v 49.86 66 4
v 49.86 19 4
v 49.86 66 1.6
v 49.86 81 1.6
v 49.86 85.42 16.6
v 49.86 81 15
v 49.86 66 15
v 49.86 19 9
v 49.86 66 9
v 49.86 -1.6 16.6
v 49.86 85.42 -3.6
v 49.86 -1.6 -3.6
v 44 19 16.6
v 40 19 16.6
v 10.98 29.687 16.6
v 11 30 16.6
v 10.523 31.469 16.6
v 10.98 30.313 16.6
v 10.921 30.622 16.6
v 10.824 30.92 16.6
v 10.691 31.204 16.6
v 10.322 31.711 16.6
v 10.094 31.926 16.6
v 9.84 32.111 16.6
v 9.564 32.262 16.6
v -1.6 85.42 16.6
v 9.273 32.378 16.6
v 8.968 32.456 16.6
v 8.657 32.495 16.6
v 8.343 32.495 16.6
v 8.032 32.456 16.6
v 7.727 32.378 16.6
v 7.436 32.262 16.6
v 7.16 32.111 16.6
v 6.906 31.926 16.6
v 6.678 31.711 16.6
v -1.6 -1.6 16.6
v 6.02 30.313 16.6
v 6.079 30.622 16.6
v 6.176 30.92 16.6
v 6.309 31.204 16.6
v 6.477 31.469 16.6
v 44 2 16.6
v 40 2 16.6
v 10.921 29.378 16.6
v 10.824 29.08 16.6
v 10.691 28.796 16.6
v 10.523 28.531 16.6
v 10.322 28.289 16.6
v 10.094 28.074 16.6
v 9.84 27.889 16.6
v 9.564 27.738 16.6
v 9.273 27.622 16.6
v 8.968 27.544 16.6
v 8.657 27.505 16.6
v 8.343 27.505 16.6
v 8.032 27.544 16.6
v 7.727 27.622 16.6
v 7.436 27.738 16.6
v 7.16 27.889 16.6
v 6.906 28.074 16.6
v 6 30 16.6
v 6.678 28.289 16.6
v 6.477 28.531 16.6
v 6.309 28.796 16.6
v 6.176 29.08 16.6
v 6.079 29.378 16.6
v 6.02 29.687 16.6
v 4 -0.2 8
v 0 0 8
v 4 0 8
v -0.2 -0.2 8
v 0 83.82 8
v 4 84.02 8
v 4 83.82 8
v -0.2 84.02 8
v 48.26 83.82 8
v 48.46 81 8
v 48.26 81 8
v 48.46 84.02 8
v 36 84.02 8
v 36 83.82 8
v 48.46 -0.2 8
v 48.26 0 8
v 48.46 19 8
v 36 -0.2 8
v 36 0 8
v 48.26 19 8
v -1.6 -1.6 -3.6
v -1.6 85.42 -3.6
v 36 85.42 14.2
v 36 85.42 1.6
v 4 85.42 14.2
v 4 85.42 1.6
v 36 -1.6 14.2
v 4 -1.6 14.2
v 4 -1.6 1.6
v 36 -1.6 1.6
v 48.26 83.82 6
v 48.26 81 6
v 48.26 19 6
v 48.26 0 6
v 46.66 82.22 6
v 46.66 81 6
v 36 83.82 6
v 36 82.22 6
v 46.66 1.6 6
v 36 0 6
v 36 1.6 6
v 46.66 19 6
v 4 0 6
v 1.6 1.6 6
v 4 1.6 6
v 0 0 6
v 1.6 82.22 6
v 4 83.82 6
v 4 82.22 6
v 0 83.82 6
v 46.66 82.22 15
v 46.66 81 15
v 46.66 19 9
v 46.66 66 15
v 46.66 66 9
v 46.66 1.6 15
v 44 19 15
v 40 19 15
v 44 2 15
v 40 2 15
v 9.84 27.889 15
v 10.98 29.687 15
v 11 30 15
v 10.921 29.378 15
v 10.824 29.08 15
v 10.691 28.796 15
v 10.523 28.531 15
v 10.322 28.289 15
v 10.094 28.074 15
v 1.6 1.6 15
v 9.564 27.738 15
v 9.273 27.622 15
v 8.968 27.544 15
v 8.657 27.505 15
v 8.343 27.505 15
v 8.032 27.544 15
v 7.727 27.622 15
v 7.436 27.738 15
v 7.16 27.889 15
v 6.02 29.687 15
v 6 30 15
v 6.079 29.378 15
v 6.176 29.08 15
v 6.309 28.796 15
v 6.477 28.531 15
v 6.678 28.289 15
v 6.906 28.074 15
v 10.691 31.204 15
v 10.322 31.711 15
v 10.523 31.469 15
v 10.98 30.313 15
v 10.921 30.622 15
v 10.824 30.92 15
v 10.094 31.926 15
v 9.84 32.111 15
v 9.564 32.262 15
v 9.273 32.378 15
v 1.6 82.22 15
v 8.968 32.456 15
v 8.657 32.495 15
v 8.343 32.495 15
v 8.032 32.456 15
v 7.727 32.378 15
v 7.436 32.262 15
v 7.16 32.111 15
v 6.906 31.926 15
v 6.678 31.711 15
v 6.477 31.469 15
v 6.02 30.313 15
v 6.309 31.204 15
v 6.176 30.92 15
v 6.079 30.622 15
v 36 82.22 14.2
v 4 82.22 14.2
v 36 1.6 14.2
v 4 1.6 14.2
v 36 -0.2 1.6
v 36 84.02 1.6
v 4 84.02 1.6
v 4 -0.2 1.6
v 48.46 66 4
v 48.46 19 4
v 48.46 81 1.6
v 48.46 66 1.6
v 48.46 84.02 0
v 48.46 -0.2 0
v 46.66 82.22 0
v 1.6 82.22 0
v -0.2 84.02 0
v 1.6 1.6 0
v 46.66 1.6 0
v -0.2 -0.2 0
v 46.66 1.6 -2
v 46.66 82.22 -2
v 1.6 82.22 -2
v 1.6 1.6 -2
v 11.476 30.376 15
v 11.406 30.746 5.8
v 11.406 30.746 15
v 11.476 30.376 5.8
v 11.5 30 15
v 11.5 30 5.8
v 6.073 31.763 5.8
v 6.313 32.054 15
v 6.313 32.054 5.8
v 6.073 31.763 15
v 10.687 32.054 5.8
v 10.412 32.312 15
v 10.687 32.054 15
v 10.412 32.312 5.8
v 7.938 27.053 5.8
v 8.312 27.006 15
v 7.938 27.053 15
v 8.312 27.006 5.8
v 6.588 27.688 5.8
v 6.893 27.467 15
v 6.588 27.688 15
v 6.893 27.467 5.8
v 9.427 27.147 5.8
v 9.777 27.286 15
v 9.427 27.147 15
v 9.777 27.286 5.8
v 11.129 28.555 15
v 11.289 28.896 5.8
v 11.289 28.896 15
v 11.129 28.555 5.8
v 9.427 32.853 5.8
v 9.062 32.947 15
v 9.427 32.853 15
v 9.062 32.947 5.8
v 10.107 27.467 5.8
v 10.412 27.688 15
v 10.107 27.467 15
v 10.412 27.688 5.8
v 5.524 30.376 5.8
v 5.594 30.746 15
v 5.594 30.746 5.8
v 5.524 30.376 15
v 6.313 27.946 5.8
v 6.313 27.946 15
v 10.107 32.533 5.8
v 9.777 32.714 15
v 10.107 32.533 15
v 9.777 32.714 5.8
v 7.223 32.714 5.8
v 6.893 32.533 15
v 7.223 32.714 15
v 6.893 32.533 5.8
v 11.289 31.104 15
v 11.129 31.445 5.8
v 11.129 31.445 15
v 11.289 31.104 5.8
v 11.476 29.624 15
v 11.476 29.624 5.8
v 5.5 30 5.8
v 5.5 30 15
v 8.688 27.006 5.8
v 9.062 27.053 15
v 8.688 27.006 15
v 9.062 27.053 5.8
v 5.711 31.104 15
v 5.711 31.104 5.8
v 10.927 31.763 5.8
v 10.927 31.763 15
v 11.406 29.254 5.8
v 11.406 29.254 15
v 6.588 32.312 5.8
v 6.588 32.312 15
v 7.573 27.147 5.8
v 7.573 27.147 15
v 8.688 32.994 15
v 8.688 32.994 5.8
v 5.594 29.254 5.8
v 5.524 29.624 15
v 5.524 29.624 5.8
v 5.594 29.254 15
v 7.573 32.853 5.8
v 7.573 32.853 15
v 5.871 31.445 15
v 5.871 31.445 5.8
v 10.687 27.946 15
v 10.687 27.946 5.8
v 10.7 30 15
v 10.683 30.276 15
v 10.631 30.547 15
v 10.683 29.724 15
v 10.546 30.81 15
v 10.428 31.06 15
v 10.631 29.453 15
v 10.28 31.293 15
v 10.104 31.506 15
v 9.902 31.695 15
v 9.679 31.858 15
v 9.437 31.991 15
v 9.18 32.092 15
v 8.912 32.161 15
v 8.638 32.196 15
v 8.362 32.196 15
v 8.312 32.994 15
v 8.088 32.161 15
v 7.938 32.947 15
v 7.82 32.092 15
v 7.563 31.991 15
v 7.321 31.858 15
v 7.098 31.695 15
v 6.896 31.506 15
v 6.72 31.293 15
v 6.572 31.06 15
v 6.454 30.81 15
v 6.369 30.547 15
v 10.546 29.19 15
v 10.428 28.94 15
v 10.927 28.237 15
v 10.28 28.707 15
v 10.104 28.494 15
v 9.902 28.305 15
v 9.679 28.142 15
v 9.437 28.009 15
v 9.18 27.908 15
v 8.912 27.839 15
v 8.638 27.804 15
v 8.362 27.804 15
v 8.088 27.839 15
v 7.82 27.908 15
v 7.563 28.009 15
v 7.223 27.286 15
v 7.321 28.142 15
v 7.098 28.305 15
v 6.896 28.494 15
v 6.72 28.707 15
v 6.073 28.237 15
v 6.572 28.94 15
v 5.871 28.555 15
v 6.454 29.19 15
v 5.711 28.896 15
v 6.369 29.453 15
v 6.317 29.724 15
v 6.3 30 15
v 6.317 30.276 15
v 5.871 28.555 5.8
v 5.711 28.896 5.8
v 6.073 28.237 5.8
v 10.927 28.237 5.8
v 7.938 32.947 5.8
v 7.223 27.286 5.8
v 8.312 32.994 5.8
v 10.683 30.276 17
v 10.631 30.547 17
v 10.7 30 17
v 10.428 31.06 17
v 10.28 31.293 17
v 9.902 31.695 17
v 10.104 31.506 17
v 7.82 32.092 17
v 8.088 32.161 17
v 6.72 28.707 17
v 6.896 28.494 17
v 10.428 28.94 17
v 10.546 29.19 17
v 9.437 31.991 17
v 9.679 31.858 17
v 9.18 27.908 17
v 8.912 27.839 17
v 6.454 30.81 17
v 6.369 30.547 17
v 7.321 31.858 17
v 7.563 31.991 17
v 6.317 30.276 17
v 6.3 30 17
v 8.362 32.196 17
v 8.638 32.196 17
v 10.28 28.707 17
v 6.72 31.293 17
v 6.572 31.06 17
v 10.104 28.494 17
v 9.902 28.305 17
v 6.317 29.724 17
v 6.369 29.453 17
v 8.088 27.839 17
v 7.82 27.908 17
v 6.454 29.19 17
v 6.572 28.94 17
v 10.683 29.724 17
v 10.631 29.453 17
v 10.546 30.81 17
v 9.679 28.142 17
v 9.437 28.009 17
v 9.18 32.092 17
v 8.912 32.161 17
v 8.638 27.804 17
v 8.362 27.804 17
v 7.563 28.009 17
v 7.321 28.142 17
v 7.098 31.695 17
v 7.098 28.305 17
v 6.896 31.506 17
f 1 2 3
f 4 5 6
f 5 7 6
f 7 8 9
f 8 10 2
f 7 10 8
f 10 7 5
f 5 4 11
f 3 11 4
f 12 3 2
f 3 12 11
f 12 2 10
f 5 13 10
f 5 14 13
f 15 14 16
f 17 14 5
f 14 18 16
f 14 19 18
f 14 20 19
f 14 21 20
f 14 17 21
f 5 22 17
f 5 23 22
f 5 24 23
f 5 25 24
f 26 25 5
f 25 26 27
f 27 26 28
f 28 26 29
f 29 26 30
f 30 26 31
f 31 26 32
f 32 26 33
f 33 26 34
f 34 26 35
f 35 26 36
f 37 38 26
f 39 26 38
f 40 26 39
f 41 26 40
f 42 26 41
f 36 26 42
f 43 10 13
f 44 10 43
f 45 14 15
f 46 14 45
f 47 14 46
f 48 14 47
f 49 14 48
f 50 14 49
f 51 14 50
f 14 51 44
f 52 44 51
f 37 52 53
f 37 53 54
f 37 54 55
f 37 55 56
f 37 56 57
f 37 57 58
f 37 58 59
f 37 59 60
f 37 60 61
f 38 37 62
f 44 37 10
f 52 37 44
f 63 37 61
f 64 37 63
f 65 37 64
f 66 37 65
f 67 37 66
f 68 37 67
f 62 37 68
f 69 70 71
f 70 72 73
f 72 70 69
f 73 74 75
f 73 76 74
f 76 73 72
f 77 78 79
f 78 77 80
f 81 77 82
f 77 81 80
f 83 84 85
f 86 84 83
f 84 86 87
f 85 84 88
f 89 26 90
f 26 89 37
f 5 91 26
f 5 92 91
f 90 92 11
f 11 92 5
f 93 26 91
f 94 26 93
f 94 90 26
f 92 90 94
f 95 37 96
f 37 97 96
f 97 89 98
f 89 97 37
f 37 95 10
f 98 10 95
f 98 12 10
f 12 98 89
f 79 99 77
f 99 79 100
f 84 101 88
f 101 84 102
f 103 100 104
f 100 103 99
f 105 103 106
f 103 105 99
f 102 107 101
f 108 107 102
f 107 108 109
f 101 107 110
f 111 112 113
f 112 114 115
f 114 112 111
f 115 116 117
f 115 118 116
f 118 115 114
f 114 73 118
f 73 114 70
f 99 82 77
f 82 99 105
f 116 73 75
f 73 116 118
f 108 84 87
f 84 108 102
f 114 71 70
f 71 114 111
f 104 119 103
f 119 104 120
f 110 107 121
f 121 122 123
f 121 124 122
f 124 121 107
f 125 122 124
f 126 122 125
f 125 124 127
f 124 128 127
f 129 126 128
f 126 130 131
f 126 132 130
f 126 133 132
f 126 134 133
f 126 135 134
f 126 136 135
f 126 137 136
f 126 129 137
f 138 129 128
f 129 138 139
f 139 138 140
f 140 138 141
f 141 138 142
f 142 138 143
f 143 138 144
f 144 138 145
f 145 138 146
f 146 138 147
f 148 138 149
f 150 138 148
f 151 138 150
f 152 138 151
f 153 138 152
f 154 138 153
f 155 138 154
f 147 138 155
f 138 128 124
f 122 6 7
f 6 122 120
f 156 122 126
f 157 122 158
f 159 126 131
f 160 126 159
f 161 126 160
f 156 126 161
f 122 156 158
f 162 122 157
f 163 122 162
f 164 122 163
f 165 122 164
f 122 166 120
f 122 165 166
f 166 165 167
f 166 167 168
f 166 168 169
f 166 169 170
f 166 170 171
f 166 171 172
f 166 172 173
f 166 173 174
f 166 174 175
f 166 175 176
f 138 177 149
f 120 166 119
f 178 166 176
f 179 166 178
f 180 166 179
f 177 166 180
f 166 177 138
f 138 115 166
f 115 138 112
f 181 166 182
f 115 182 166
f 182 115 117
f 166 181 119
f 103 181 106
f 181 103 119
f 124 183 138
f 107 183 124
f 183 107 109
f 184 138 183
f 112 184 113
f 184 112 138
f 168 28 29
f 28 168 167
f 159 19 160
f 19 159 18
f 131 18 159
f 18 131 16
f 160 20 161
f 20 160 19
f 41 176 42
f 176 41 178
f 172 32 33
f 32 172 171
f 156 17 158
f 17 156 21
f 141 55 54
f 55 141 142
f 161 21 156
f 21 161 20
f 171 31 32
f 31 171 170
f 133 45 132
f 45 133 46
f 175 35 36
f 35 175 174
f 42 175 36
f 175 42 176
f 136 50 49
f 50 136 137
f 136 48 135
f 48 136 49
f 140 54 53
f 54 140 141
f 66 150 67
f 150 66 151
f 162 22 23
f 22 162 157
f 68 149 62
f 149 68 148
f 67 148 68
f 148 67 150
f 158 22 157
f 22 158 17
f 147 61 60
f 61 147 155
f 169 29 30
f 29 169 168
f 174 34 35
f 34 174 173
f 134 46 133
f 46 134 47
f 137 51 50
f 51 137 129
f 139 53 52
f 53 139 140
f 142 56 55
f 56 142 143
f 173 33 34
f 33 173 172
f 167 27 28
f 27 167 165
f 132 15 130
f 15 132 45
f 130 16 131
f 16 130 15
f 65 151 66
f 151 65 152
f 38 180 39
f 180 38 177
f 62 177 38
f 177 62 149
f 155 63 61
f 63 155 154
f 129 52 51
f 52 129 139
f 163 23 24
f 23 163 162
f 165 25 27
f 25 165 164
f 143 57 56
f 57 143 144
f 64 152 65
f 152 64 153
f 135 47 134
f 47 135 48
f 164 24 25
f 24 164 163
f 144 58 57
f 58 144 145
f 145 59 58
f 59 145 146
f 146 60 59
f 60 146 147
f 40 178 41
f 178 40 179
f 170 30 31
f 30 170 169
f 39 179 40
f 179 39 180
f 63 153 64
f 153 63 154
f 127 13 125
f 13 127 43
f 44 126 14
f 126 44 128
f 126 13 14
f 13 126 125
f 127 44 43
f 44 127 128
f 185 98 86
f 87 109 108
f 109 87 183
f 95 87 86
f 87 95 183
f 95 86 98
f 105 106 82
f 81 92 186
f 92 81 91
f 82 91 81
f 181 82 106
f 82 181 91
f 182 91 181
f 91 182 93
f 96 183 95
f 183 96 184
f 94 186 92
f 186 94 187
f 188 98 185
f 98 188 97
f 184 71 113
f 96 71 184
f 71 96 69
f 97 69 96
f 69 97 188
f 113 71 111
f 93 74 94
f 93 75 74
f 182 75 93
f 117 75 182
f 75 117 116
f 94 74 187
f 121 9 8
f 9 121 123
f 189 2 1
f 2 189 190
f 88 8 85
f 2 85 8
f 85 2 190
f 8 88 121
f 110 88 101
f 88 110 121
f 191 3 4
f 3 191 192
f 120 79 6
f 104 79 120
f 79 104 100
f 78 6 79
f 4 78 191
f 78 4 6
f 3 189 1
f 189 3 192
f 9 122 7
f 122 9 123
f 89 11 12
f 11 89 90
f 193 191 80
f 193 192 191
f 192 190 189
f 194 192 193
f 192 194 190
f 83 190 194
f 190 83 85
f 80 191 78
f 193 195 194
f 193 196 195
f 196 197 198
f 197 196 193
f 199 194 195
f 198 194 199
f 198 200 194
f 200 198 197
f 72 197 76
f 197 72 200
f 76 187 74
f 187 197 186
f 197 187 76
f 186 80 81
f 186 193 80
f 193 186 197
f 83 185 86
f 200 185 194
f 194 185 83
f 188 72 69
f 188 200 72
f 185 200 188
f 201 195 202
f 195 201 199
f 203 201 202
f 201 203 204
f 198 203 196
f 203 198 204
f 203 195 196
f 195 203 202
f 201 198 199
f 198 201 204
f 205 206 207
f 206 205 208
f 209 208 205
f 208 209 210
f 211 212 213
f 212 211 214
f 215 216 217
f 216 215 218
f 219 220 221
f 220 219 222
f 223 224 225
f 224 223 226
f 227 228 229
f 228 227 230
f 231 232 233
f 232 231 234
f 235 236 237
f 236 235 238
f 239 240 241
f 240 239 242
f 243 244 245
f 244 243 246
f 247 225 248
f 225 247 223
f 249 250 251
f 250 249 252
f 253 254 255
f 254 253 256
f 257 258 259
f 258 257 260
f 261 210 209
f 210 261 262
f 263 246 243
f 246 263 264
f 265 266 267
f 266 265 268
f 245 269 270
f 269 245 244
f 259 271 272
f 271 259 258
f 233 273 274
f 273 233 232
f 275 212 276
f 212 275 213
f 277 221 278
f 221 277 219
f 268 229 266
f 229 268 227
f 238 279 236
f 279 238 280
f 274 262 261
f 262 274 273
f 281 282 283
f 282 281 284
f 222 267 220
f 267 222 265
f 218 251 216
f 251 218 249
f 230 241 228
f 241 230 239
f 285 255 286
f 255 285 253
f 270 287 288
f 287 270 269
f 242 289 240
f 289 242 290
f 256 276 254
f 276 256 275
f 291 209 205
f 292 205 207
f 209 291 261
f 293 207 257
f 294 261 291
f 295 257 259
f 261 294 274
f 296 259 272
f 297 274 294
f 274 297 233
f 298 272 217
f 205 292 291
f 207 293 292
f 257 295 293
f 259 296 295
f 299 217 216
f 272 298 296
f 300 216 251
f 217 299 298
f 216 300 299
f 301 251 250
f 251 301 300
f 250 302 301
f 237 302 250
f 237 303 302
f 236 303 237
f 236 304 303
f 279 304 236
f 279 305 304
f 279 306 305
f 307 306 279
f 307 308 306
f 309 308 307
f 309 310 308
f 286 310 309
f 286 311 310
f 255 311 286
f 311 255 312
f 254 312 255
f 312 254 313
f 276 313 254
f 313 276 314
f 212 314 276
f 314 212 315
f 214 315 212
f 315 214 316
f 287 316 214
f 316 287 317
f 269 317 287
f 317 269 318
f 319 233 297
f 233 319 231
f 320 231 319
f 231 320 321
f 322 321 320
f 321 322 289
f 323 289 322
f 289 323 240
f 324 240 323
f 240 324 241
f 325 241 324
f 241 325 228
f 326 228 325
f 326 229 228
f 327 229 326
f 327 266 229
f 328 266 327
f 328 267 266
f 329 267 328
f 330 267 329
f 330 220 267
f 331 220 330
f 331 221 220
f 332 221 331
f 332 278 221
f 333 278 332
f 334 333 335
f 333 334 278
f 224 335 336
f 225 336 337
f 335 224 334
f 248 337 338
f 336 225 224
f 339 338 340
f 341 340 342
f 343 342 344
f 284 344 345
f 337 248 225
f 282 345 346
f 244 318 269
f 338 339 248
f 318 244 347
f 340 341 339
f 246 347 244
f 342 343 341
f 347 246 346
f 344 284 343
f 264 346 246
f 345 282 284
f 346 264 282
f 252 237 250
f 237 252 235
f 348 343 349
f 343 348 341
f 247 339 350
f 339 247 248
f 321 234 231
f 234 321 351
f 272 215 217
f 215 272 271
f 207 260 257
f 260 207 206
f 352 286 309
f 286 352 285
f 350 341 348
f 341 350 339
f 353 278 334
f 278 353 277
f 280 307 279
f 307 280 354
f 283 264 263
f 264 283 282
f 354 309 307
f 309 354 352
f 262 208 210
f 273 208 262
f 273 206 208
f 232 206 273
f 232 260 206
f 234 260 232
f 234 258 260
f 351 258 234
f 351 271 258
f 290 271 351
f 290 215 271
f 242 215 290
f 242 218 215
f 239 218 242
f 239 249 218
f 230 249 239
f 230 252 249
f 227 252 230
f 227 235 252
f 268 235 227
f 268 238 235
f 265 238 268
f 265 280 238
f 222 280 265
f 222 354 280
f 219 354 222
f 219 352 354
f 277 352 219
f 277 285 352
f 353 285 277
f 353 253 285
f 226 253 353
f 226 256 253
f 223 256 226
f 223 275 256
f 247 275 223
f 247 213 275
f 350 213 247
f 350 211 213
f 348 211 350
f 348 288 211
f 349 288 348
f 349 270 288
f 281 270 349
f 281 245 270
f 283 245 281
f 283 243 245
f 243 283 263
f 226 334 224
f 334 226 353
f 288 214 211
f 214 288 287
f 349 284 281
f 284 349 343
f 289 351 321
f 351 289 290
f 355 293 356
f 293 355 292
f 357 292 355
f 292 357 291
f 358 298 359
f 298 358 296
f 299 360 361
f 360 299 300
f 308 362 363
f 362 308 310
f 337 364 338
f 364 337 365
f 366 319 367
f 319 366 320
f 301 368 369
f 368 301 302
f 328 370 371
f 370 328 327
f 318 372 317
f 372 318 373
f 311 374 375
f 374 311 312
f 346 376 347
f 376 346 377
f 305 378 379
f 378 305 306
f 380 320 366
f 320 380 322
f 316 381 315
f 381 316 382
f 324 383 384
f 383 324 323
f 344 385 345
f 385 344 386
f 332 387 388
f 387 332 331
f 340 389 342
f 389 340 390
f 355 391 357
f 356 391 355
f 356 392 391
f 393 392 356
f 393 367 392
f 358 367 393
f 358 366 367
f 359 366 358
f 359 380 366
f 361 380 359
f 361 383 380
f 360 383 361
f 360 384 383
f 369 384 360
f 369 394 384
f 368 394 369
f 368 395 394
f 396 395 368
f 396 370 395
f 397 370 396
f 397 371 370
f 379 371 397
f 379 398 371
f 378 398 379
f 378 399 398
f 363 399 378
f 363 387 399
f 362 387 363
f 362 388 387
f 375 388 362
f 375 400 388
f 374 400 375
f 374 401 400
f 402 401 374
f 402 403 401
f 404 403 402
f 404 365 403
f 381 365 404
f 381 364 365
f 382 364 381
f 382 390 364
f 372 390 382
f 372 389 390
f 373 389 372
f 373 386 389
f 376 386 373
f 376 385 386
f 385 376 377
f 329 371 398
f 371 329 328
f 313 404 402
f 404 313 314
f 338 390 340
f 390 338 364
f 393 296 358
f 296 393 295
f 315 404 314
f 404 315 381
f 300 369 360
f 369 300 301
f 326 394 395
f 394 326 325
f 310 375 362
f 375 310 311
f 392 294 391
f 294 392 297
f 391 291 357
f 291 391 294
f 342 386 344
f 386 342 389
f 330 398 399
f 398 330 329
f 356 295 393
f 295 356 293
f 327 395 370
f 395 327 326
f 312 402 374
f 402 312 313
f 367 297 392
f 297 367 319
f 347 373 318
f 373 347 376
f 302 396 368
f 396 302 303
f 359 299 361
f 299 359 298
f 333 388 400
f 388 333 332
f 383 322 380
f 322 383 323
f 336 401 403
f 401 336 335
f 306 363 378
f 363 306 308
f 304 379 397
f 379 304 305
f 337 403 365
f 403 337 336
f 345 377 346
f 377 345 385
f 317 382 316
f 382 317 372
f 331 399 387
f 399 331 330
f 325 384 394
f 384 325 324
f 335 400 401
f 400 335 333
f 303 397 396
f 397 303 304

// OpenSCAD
/**********************************/
/*                                */
/*   Pluggy Reloaded Rev.1 Case   */
/*                                */
/**********************************/

///// BEGIN PARAMETERS //////

$fn = 50;

EPSILON = 0.1;

wall_thickness = 1.6;

// distance between moving parts
clearance = 0.2;

// pcb dimensions
board_width = 48.26;
board_length = 83.82;
board_thickness = 1.6;

// total height from pcb underside to ceiling
inner_height = 15;

// lip on top case half to fit halves together
lip_width = 1.6;
lip_height = 2;

// shelf where the pcb rests on
shelf_width = 1.6;
shelf_height = 2;

// portion of the inner_height used by the bottom half of the case
bottom_half_height = 8;

// reset button
button_x = 8.5;
button_y = 30;
button_hole_radius = 2.5;
button_lower_radius = 3;
button_top_radius = 2.2;
button_top_height = 2;
button_pcb_offset = 4.2;

// analog pin header
expansion_header_x = 42;
expansion_header_y = 10.5;
expansion_header_width = 4;
expansion_header_height = 17;

// game gontroller and gigatron ports
d_sub_x = 4;
d_sub_z = 1.6;
d_sub_height = 12.6;
d_sub_width = 32;

// usb and micro sd
usb_sd_y = 19;
usb_sd_z = 4;
usb_sd_width = 51; // deliberately oversized to join with PS/2 cutout
usb_sd_height = 5;

// ps/2
ps2_y = 66;
ps2_z = 1.6;
ps2_width = 15;
ps2_height = 13.4;


/////  END PARAMETERS  //////

///// BEGIN OBJECTS //////

color([0, 0.5, 0, 0.3]) %pcb();
color([0.5, 0.5, 0.5]) top_case();
color([0.3, 0.3, 0.3]) bottom_case();
color([0, 0, 0]) button();

///// END OBJECTS //////

///// BEGIN CODE //////

total_width = board_width + 2 * wall_thickness;
total_length = board_length + 2 * wall_thickness;
total_height = inner_height + shelf_height + 2 * wall_thickness;

top_half_height = inner_height - bottom_half_height;


module pcb()
{
    cube([board_width, board_length, board_thickness]);
}

module top_case()
{
    difference()
    {
        difference()
        {
            union()
            {
                translate([-wall_thickness, -wall_thickness, bottom_half_height])
                {
                    cube([total_width, total_length, top_half_height + wall_thickness]);
                }
                translate([0, 0, bottom_half_height - lip_height])
                {
                    cube([board_width, board_length, bottom_half_height - lip_height]);
                }
            }
            translate([lip_width, lip_width, bottom_half_height - lip_height - EPSILON])
            {
                cube([
                    board_width - 2 * lip_width,
                    board_length - 2 * lip_width,
                    top_half_height + lip_height + EPSILON
                ]);
            }
        }
        cutouts();
        
    }
}

module bottom_case()
{
    difference()
    {
        difference()
        {
            translate([-wall_thickness, -wall_thickness, -wall_thickness - shelf_height])
            {
                cube([total_width, total_length, bottom_half_height + shelf_height + wall_thickness]);
            }
            translate([-clearance, -clearance, 0])
            {
                cube([board_width + 2 * clearance, board_length + 2 * clearance, bottom_half_height + EPSILON]);
            }     
            translate([shelf_width, shelf_width, -shelf_height])
            {
                cube([
                    board_width - 2 * shelf_width,
                    board_length - 2 * shelf_width,
                    shelf_height + EPSILON
                ]);
            }
        }
        cutouts();
        
    }
}

module cutouts()
{
    union()
    {
        // reset button
        translate([
            button_x,
            button_y,
            inner_height - EPSILON
        ])
        {
            cylinder(h = wall_thickness + 2 * EPSILON, r1 = 2.5, r2 = 2.5);
        }
        // analog header
        translate([
            expansion_header_x - expansion_header_width / 2,
            expansion_header_y - expansion_header_height / 2,
            inner_height - EPSILON
        ])
        {
            cube([expansion_header_width, expansion_header_height, wall_thickness + 2 * EPSILON]);
        }
        // d_sub
        translate([d_sub_x, -EPSILON-wall_thickness, d_sub_z])
        {
            cube([d_sub_width, total_length + 2 * EPSILON, d_sub_height]);
        }
        // SD and USB
        translate([
            board_width - lip_width - EPSILON,
            usb_sd_y,
            usb_sd_z
        ])
        {
            cube([lip_width + wall_thickness + 2 * EPSILON, usb_sd_width, usb_sd_height]);
        }
        // PS/2
        translate([
            board_width - lip_width - EPSILON,
            ps2_y,
            ps2_z
        ])
        {
            cube([lip_width + wall_thickness + 2 * EPSILON, ps2_width, ps2_height]);
        }
    }
}

button_lower_height = inner_height - (button_pcb_offset + board_thickness);

module button()
{
    translate([button_x, button_y, button_pcb_offset + board_thickness]) {
        union() {
            cylinder(h=button_lower_height, r1=button_lower_radius, r2=button_lower_radius);
            cylinder(h=button_lower_height + button_top_height, r1=button_top_radius, r2=button_top_radius);
        }
    }
}

///// END CODE //////
